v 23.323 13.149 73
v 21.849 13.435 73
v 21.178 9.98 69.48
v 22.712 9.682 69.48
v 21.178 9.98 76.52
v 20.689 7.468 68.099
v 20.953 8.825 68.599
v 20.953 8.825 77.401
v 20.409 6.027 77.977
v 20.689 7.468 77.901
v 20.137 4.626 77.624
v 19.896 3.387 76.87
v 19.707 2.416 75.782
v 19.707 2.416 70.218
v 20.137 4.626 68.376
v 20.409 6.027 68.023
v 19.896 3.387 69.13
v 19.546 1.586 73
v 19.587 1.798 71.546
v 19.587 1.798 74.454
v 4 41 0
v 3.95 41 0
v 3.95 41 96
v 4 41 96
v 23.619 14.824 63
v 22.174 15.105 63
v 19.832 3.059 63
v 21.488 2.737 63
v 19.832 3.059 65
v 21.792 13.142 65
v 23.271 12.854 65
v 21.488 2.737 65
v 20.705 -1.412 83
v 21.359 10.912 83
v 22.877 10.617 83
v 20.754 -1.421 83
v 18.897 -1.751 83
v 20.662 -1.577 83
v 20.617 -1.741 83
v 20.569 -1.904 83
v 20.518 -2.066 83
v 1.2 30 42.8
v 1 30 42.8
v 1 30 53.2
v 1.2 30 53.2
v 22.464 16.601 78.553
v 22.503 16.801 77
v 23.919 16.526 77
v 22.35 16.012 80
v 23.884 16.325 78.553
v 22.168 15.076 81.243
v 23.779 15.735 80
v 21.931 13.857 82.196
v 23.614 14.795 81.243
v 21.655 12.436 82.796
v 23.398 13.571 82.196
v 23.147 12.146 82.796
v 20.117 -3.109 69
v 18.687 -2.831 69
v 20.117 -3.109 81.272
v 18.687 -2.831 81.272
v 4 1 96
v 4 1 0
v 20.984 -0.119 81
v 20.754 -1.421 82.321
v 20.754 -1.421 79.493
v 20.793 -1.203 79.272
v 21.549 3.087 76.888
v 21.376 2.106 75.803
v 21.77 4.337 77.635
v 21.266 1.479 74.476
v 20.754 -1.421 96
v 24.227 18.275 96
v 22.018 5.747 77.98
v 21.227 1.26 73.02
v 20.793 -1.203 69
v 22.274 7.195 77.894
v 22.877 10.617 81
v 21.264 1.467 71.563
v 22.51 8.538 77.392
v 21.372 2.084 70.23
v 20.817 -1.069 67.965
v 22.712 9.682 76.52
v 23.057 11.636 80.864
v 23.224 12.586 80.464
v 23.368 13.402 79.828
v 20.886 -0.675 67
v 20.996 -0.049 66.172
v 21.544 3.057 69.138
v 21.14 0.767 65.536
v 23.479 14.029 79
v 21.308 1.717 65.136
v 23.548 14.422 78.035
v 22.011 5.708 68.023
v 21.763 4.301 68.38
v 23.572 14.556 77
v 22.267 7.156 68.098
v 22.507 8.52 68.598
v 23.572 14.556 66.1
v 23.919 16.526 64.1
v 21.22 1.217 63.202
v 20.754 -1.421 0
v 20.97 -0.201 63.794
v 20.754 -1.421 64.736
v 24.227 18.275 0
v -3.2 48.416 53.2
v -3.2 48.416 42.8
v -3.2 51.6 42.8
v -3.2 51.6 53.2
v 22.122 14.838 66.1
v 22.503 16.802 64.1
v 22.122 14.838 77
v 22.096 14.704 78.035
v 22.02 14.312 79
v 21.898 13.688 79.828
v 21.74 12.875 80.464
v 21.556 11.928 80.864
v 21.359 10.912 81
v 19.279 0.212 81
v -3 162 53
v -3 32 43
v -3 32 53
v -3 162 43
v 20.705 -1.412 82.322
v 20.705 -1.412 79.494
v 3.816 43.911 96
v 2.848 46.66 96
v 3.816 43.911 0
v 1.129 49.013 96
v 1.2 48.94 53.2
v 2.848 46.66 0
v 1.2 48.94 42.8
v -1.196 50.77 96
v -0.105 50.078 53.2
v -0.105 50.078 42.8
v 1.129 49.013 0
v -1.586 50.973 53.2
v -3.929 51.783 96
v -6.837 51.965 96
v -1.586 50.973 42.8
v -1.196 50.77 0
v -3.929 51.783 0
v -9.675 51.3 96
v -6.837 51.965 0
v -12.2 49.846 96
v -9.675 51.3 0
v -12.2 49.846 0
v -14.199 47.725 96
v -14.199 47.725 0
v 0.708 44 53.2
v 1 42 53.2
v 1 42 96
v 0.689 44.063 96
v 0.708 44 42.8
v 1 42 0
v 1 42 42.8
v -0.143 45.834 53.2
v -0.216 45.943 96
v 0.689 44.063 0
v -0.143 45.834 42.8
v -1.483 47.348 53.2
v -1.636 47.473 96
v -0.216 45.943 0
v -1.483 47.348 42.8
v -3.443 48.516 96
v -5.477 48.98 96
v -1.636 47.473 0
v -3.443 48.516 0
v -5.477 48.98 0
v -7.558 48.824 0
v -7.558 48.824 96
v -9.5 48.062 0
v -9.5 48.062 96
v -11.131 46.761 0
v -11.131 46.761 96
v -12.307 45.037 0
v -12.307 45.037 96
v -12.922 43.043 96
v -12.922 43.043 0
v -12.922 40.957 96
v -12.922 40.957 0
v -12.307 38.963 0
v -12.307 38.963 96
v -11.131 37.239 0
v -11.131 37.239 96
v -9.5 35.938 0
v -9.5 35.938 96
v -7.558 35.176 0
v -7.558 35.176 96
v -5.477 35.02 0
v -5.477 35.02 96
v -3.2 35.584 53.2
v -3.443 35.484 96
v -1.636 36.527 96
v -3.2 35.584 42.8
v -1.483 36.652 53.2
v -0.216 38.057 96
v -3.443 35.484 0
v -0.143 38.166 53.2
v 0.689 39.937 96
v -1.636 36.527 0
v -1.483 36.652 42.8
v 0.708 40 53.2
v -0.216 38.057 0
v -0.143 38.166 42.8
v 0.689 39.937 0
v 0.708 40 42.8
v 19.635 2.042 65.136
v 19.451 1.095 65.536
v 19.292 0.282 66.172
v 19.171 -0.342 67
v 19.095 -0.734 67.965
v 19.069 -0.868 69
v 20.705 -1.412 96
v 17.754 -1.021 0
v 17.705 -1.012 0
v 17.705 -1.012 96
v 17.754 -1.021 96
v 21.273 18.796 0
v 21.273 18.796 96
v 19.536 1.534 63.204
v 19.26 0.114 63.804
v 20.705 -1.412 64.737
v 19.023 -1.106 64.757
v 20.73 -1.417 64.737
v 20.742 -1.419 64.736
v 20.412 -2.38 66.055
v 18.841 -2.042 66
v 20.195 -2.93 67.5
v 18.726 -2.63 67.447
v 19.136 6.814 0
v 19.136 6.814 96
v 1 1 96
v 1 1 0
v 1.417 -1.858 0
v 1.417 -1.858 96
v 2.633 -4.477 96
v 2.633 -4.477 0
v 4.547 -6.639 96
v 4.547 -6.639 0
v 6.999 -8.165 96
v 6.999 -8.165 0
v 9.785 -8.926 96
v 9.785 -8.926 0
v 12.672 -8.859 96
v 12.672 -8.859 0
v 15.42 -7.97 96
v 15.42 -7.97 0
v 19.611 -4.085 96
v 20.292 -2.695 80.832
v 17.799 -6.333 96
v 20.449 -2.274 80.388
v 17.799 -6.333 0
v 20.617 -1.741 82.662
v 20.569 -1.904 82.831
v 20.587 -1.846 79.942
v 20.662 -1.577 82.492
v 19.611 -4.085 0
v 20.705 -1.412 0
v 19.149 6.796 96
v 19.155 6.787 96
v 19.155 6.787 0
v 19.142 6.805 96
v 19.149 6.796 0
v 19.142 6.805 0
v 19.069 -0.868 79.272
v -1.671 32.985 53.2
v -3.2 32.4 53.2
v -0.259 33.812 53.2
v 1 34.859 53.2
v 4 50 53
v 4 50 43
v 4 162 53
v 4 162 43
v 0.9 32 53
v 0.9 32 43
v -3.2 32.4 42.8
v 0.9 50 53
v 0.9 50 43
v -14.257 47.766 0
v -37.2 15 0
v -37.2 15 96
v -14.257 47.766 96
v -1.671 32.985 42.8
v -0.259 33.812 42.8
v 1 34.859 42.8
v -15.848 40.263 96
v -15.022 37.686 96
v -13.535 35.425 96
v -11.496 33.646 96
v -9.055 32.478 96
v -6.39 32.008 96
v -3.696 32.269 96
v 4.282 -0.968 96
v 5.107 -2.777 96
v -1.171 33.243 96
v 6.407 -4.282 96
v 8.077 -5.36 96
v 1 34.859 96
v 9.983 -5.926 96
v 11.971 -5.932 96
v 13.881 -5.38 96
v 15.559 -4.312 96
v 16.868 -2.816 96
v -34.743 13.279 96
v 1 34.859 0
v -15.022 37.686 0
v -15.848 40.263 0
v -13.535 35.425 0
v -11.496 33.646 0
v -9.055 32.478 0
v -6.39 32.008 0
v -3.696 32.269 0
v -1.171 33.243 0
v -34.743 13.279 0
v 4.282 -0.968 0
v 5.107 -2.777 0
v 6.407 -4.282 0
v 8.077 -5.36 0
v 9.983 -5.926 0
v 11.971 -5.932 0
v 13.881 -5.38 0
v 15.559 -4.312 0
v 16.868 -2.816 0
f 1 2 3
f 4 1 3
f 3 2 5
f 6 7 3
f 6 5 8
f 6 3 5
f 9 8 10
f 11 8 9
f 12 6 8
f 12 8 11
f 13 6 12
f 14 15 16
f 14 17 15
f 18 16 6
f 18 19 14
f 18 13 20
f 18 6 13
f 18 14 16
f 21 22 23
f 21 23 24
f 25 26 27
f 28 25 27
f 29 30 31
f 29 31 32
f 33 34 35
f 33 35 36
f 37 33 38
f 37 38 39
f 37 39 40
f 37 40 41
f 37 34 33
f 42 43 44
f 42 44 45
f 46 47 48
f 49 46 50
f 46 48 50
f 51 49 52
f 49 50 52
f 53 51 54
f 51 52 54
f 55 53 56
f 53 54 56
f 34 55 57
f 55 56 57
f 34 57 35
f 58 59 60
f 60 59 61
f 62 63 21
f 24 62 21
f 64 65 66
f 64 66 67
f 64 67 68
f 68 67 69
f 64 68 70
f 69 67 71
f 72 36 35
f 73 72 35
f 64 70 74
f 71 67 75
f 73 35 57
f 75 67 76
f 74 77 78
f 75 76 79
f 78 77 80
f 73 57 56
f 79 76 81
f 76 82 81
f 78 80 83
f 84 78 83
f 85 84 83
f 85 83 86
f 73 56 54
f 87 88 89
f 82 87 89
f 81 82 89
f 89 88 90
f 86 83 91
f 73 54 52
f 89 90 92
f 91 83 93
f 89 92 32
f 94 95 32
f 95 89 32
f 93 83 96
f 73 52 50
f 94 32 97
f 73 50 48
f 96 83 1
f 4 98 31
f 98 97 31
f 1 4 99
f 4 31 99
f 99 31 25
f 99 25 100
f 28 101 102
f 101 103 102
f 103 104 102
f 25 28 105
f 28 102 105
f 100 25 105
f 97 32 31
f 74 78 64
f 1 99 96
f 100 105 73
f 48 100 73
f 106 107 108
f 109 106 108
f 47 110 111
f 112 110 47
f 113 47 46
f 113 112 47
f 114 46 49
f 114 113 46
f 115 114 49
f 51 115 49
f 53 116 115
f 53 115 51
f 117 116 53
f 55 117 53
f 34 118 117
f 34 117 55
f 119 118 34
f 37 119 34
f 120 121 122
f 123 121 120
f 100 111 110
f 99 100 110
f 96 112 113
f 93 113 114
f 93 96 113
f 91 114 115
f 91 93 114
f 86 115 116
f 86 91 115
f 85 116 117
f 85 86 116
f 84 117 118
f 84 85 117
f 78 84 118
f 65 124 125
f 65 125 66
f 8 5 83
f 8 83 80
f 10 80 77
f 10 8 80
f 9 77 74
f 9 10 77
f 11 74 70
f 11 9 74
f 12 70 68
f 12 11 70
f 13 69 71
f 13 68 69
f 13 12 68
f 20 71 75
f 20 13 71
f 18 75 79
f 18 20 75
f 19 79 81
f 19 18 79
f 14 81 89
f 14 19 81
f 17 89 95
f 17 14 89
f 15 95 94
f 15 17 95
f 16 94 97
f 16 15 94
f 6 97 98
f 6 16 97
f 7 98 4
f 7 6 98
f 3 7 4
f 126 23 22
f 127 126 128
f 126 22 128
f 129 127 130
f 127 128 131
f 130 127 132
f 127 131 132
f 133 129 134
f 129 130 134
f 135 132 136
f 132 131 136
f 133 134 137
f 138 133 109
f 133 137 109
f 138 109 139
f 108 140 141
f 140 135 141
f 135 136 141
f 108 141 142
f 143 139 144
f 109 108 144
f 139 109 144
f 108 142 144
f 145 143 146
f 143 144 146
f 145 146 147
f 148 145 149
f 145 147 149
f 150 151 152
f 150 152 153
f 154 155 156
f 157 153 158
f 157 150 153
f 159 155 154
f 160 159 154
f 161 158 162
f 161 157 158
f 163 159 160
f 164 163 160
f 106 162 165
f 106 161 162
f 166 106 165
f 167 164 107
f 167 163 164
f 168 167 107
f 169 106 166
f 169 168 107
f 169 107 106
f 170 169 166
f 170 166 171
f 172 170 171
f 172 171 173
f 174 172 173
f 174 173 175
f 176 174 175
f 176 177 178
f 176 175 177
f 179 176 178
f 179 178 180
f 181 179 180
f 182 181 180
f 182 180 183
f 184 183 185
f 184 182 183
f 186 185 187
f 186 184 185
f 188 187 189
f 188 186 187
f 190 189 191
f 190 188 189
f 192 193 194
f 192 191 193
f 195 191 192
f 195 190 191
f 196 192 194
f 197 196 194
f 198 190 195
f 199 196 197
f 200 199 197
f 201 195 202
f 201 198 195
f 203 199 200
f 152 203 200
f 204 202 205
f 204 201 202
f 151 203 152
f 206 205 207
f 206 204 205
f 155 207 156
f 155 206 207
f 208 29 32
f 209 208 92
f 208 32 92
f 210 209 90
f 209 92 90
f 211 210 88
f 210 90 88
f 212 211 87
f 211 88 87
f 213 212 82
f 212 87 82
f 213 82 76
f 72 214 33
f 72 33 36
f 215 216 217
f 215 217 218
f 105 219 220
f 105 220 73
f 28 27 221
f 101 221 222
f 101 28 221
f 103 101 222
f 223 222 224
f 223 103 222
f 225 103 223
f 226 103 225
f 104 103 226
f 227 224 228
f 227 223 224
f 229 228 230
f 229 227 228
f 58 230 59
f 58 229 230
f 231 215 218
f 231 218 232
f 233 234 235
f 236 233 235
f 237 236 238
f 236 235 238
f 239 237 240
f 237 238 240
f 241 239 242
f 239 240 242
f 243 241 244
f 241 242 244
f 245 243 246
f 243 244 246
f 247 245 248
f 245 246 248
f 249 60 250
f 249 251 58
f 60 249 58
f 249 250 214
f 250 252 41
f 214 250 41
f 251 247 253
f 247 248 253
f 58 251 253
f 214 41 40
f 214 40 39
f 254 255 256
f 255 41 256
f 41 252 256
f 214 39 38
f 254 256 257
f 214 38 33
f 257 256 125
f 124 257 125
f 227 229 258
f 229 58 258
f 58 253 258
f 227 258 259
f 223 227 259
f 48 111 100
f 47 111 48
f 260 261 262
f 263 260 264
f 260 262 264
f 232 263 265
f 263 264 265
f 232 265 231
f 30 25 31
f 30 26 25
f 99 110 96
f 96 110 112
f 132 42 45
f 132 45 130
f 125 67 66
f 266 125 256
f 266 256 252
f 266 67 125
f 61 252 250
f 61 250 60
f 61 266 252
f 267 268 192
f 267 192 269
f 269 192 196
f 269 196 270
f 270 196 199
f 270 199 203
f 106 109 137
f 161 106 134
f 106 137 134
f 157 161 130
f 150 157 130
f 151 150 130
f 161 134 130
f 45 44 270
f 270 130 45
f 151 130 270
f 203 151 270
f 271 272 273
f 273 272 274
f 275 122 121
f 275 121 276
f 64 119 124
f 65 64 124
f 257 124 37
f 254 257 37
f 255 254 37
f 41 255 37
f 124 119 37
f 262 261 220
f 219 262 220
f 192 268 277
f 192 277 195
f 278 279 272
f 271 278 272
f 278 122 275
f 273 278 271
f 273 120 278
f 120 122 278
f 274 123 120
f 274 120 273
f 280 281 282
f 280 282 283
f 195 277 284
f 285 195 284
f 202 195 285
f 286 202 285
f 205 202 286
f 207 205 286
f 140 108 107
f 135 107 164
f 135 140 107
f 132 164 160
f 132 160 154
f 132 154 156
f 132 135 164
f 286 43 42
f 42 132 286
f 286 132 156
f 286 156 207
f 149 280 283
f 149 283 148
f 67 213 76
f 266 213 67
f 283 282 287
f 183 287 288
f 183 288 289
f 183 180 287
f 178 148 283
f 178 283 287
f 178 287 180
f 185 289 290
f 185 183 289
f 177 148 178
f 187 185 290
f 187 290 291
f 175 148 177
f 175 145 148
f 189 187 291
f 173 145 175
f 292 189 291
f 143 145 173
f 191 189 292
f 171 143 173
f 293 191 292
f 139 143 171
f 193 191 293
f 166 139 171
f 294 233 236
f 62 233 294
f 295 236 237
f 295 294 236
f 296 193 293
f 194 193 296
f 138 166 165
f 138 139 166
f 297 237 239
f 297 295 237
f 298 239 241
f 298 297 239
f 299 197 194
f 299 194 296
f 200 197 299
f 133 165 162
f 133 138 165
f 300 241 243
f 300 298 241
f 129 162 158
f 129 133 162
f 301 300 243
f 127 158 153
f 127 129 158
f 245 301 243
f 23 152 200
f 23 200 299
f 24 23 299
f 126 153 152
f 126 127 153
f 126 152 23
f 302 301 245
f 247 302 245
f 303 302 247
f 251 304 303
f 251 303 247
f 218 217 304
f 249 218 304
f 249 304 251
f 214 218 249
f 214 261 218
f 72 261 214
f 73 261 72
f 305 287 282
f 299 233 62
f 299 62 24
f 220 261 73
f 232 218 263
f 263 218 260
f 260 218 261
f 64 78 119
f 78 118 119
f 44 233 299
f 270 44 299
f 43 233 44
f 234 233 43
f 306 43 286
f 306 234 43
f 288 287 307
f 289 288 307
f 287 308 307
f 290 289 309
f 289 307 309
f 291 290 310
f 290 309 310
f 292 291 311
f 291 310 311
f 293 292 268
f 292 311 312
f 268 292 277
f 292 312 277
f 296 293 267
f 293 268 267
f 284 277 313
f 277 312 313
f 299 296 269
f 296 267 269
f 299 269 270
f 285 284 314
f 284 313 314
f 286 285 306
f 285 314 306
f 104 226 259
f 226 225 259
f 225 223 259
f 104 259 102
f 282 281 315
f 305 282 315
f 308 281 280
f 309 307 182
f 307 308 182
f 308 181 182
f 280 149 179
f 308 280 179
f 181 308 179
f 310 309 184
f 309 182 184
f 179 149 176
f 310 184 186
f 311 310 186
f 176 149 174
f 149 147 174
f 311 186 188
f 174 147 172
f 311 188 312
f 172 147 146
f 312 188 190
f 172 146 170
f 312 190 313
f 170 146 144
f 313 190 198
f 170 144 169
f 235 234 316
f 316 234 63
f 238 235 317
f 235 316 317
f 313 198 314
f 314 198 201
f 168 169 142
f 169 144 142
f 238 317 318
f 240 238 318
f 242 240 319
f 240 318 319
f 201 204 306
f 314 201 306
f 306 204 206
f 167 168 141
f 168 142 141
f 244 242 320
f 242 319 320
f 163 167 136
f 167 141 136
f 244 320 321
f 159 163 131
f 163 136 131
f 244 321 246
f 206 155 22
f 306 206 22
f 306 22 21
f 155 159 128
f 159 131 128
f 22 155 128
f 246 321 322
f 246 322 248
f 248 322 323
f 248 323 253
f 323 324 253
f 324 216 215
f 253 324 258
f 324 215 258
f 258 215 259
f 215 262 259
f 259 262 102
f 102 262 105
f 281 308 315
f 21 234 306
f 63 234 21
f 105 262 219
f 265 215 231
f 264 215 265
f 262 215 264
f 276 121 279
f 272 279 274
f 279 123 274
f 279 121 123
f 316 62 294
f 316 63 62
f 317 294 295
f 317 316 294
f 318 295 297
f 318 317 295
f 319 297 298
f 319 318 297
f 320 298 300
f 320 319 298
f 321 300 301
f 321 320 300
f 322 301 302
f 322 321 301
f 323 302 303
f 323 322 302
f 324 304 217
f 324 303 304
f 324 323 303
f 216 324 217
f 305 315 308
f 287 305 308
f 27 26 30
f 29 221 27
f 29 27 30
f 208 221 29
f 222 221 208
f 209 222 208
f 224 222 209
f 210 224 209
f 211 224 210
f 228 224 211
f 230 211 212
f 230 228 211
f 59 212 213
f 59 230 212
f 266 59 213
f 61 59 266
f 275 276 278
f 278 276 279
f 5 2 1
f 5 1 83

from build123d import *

# Parameters (mm, degrees)
BOX011_W                  = 10
BOX011_H                  = 25
BOX011_DEPTH              = 13
BOX010_W                  = 7
BOX010_H                  = 130
BOX010_DEPTH              = 10
BOX006_W                  = 5
BOX006_H                  = 5
BOX006_DEPTH              = 3
BOX006_PLACEMENT_ANGLE    = 45
CYLINDER005_R             = 5
CYLINDER005_DEPTH         = 3
BOX008_W                  = 34
BOX008_H                  = 2
BOX008_DEPTH              = 10
BOX008_PLACEMENT_ANGLE    = 45
BOX007_W                  = 16
BOX007_H                  = 16
BOX007_DEPTH              = 6
FILLET_R                  = 4
FILLET001_R               = 4
BOX009_W                  = 20
BOX009_H                  = 20
BOX009_DEPTH              = 3
FILLET002_R               = 6
FILLET003_R               = 6
FUSION005_ROLL_ANGLE      = -123.111634
FUSION005_PITCH_ANGLE     = -89.999828
FUSION005_PLACEMENT_ANGLE = -67.888254
BOX005_W                  = 12
BOX005_H                  = 10
BOX005_DEPTH              = 100
BOX005_PLACEMENT_ANGLE    = -9
BOX004_W                  = 3
BOX004_H                  = 20
BOX004_DEPTH              = 96
BOX004_PLACEMENT_ANGLE    = -10
BOX_W                     = 3
BOX_H                     = 40
BOX_DEPTH                 = 96
BOX012_W                  = 4.4
BOX012_H                  = 25
BOX012_DEPTH              = 10.4
CYLINDER003_R             = 7
CYLINDER003_DEPTH         = 100
CYLINDER004_R             = 7
CYLINDER004_DEPTH         = 102
BOX001_W                  = 3
BOX001_H                  = 40
BOX001_DEPTH              = 96
BOX001_PLACEMENT_ANGLE    = -35
CYLINDER_R                = 10
CYLINDER_DEPTH            = 96
BOX002_W                  = 3
BOX002_H                  = 40
BOX002_DEPTH              = 96
CYLINDER002_R             = 10
CYLINDER002_DEPTH         = 96
BOX003_W                  = 3
BOX003_H                  = 20
BOX003_DEPTH              = 96
BOX003_PLACEMENT_ANGLE    = -10


with BuildPart() as cube011:
    # Box011 → Box011 (new body)
    with BuildSketch(Plane(origin=(0.9, 25, 41), x_dir=(1, 0, 0), z_dir=(0, 0, 1))):
        with Locations((5, 12.5)):
            Rectangle(BOX011_W, BOX011_H)
    extrude(amount=BOX011_DEPTH)


with BuildPart() as stick:
    # Box010 → Box010 (new body)
    with BuildSketch(Plane(origin=(-3, 32, 43), x_dir=(1, 0, 0), z_dir=(0, 0, 1))):
        with Locations((3.5, 65)):
            Rectangle(BOX010_W, BOX010_H)
    extrude(amount=BOX010_DEPTH)

    # Cut008: cut Cube011
    add(cube011.part, mode=Mode.SUBTRACT)


with BuildPart() as cube006:
    # Box006 → Box006 (new body)
    with BuildSketch(Plane.XY):
        with Locations((2.5, 2.5)):
            Rectangle(BOX006_W, BOX006_H)
    extrude(amount=BOX006_DEPTH)


with BuildPart() as cube006_1:
    # Box006 placement: moved
    add(cube006.part.moved(Location((0, -7.071, 0))).rotate(Axis((0, -7.071, 0), (0, 0, 1)), BOX006_PLACEMENT_ANGLE))


with BuildPart() as fusion004:
    # Cylinder005 → Cylinder005 (new body)
    with BuildSketch(Plane.XY):
        Circle(CYLINDER005_R)
    extrude(amount=CYLINDER005_DEPTH)

    # Fusion004: union Cube006
    add(cube006_1.part)


with BuildPart() as cube008:
    # Box008 → Box008 (new body)
    with BuildSketch(Plane.XY):
        with Locations((17, 1)):
            Rectangle(BOX008_W, BOX008_H)
    extrude(amount=BOX008_DEPTH)


with BuildPart() as cube008_1:
    # Box008 placement: moved
    add(cube008.part.moved(Location((-10.4, -12, -3))).rotate(Axis((-10.4, -12, -3), (0, 0, 1)), BOX008_PLACEMENT_ANGLE))


with BuildPart() as fillet001:
    # Box007 → Box007 (new body)
    with BuildSketch(Plane(origin=(-8, -8.5, -1), x_dir=(1, 0, 0), z_dir=(0, 0, 1))):
        with Locations((8, 8)):
            Rectangle(BOX007_W, BOX007_H)
    extrude(amount=BOX007_DEPTH)

    # Fillet
    fillet_edges = [fillet001.edges().sort_by_distance(p)[0] for p in [
        (-8, 7.5, 2),
    ]]
    fillet(fillet_edges, radius=FILLET_R)

    # Fillet001
    fillet001_edges = [fillet001.edges().sort_by_distance(p)[0] for p in [
        (8, -8.5, 2),
    ]]
    fillet(fillet001_edges, radius=FILLET001_R)


with BuildPart() as rrp_logo:
    # Box009 → Box009 (new body)
    with BuildSketch(Plane(origin=(-10, -10.5, 0), x_dir=(1, 0, 0), z_dir=(0, 0, 1))):
        with Locations((10, 10)):
            Rectangle(BOX009_W, BOX009_H)
    extrude(amount=BOX009_DEPTH)

    # Fillet002
    fillet002_edges = [rrp_logo.edges().sort_by_distance(p)[0] for p in [
        (10, -10.5, 1.5),
    ]]
    fillet(fillet002_edges, radius=FILLET002_R)

    # Fillet003
    fillet003_edges = [rrp_logo.edges().sort_by_distance(p)[0] for p in [
        (-10, 9.5, 1.5),
    ]]
    fillet(fillet003_edges, radius=FILLET003_R)

    # Cut005: cut Fillet001
    add(fillet001.part, mode=Mode.SUBTRACT)

    # Cut006: cut Cube008
    add(cube008_1.part, mode=Mode.SUBTRACT)

    # Fusion005: union Fusion004
    add(fusion004.part)


with BuildPart() as rrp_logo_1:
    # Fusion005 roll: moved
    add(rrp_logo.part.rotate(Axis((0, 0, 0), (1, 0, 0)), FUSION005_ROLL_ANGLE))


with BuildPart() as rrp_logo_2:
    # Fusion005 pitch: moved
    add(rrp_logo_1.part.rotate(Axis((0, 0, 0), (0, 1, 0)), FUSION005_PITCH_ANGLE))


with BuildPart() as rrp_logo_3:
    # Fusion005 placement: moved
    add(rrp_logo_2.part.moved(Location((20.5, 6.49441, 73))).rotate(Axis((20.5, 6.49441, 73), (0, 0, 1)), FUSION005_PLACEMENT_ANGLE))


with BuildPart() as cube:
    # Box005 → Box005 (new body)
    with BuildSketch(Plane.XY):
        with Locations((6, 5)):
            Rectangle(BOX005_W, BOX005_H)
    extrude(amount=BOX005_DEPTH)


with BuildPart() as cube_1:
    # Box005 placement: moved
    add(cube.part.moved(Location((5, 6, -1))).rotate(Axis((5, 6, -1), (0, 0, 1)), BOX005_PLACEMENT_ANGLE))


with BuildPart() as cube005:
    # Box004 → Box004 (new body)
    with BuildSketch(Plane.XY):
        with Locations((1.5, 10)):
            Rectangle(BOX004_W, BOX004_H)
    extrude(amount=BOX004_DEPTH)


with BuildPart() as cube005_1:
    # Box004 placement: moved
    add(cube005.part.moved(Location((14.8, -0.5, 0))).rotate(Axis((14.8, -0.5, 0), (0, 0, 1)), BOX004_PLACEMENT_ANGLE))


with BuildPart() as cube004:
    # Box → Box (new body)
    with BuildSketch(Plane(origin=(4, 1, 0), x_dir=(1, 0, 0), z_dir=(0, 0, 1))):
        with Locations((1.5, 20)):
            Rectangle(BOX_W, BOX_H)
    extrude(amount=BOX_DEPTH)


with BuildPart() as cube012:
    # Box012 → Box012 (new body)
    with BuildSketch(Plane(origin=(-3.2, 30, 42.8), x_dir=(1, 0, 0), z_dir=(0, 0, 1))):
        with Locations((2.2, 12.5)):
            Rectangle(BOX012_W, BOX012_H)
    extrude(amount=BOX012_DEPTH)


with BuildPart() as cylinder003:
    # Cylinder003 → Cylinder003 (new body)
    with BuildSketch(Plane(origin=(-6, 42, -2), x_dir=(1, 0, 0), z_dir=(0, 0, 1))):
        Circle(CYLINDER003_R)
    extrude(amount=CYLINDER003_DEPTH)


with BuildPart() as cylinder004:
    # Cylinder004 → Cylinder004 (new body)
    with BuildSketch(Plane(origin=(11, 1, -2), x_dir=(1, 0, 0), z_dir=(0, 0, 1))):
        Circle(CYLINDER004_R)
    extrude(amount=CYLINDER004_DEPTH)


with BuildPart() as cube001:
    # Box001 → Box001 (new body)
    with BuildSketch(Plane.XY):
        with Locations((1.5, 20)):
            Rectangle(BOX001_W, BOX001_H)
    extrude(amount=BOX001_DEPTH)


with BuildPart() as cube001_1:
    # Box001 placement: moved
    add(cube001.part.moved(Location((-37.2, 15, 0))).rotate(Axis((-37.2, 15, 0), (0, 0, 1)), BOX001_PLACEMENT_ANGLE))


with BuildPart() as fusion:
    # Cylinder → Cylinder (new body)
    with BuildSketch(Plane(origin=(-6, 42, 0), x_dir=(1, 0, 0), z_dir=(0, 0, 1))):
        Circle(CYLINDER_R)
    extrude(amount=CYLINDER_DEPTH)

    # Fusion: union Cube001
    add(cube001_1.part)


with BuildPart() as fusion006:
    # Box002 → Box002 (new body)
    with BuildSketch(Plane(origin=(1, 1, 0), x_dir=(1, 0, 0), z_dir=(0, 0, 1))):
        with Locations((1.5, 20)):
            Rectangle(BOX002_W, BOX002_H)
    extrude(amount=BOX002_DEPTH)

    # Fusion006: union Fusion
    add(fusion.part)


with BuildPart() as cut011:
    # Cylinder002 → Cylinder002 (new body)
    with BuildSketch(Plane(origin=(11, 1, 0), x_dir=(1, 0, 0), z_dir=(0, 0, 1))):
        Circle(CYLINDER002_R)
    extrude(amount=CYLINDER002_DEPTH)

    # Fusion007: union Fusion006
    add(fusion006.part)

    # Cut: cut Cylinder004
    add(cylinder004.part, mode=Mode.SUBTRACT)

    # Cut009: cut Cylinder003
    add(cylinder003.part, mode=Mode.SUBTRACT)

    # Cut010: cut Cube012
    add(cube012.part, mode=Mode.SUBTRACT)

    # Cut011: cut Cube004
    add(cube004.part, mode=Mode.SUBTRACT)


with BuildPart() as holder:
    # Box003 → Box003 (new body)
    with BuildSketch(Plane.XY):
        with Locations((1.5, 10)):
            Rectangle(BOX003_W, BOX003_H)
    extrude(amount=BOX003_DEPTH)


with BuildPart() as holder_1:
    # Box003 placement: moved
    add(holder.part.moved(Location((17.8, -0.9, 0))).rotate(Axis((17.8, -0.9, 0), (0, 0, 1)), BOX003_PLACEMENT_ANGLE))

    # Fusion008: union Cut011
    add(cut011.part)

    # Cut012: cut Cube005
    add(cube005_1.part, mode=Mode.SUBTRACT)

    # Cut013: cut Cube
    add(cube_1.part, mode=Mode.SUBTRACT)

    # Cut014: cut rrp-logo
    add(rrp_logo_3.part, mode=Mode.SUBTRACT)


solid = Compound([stick.part, holder_1.part])
